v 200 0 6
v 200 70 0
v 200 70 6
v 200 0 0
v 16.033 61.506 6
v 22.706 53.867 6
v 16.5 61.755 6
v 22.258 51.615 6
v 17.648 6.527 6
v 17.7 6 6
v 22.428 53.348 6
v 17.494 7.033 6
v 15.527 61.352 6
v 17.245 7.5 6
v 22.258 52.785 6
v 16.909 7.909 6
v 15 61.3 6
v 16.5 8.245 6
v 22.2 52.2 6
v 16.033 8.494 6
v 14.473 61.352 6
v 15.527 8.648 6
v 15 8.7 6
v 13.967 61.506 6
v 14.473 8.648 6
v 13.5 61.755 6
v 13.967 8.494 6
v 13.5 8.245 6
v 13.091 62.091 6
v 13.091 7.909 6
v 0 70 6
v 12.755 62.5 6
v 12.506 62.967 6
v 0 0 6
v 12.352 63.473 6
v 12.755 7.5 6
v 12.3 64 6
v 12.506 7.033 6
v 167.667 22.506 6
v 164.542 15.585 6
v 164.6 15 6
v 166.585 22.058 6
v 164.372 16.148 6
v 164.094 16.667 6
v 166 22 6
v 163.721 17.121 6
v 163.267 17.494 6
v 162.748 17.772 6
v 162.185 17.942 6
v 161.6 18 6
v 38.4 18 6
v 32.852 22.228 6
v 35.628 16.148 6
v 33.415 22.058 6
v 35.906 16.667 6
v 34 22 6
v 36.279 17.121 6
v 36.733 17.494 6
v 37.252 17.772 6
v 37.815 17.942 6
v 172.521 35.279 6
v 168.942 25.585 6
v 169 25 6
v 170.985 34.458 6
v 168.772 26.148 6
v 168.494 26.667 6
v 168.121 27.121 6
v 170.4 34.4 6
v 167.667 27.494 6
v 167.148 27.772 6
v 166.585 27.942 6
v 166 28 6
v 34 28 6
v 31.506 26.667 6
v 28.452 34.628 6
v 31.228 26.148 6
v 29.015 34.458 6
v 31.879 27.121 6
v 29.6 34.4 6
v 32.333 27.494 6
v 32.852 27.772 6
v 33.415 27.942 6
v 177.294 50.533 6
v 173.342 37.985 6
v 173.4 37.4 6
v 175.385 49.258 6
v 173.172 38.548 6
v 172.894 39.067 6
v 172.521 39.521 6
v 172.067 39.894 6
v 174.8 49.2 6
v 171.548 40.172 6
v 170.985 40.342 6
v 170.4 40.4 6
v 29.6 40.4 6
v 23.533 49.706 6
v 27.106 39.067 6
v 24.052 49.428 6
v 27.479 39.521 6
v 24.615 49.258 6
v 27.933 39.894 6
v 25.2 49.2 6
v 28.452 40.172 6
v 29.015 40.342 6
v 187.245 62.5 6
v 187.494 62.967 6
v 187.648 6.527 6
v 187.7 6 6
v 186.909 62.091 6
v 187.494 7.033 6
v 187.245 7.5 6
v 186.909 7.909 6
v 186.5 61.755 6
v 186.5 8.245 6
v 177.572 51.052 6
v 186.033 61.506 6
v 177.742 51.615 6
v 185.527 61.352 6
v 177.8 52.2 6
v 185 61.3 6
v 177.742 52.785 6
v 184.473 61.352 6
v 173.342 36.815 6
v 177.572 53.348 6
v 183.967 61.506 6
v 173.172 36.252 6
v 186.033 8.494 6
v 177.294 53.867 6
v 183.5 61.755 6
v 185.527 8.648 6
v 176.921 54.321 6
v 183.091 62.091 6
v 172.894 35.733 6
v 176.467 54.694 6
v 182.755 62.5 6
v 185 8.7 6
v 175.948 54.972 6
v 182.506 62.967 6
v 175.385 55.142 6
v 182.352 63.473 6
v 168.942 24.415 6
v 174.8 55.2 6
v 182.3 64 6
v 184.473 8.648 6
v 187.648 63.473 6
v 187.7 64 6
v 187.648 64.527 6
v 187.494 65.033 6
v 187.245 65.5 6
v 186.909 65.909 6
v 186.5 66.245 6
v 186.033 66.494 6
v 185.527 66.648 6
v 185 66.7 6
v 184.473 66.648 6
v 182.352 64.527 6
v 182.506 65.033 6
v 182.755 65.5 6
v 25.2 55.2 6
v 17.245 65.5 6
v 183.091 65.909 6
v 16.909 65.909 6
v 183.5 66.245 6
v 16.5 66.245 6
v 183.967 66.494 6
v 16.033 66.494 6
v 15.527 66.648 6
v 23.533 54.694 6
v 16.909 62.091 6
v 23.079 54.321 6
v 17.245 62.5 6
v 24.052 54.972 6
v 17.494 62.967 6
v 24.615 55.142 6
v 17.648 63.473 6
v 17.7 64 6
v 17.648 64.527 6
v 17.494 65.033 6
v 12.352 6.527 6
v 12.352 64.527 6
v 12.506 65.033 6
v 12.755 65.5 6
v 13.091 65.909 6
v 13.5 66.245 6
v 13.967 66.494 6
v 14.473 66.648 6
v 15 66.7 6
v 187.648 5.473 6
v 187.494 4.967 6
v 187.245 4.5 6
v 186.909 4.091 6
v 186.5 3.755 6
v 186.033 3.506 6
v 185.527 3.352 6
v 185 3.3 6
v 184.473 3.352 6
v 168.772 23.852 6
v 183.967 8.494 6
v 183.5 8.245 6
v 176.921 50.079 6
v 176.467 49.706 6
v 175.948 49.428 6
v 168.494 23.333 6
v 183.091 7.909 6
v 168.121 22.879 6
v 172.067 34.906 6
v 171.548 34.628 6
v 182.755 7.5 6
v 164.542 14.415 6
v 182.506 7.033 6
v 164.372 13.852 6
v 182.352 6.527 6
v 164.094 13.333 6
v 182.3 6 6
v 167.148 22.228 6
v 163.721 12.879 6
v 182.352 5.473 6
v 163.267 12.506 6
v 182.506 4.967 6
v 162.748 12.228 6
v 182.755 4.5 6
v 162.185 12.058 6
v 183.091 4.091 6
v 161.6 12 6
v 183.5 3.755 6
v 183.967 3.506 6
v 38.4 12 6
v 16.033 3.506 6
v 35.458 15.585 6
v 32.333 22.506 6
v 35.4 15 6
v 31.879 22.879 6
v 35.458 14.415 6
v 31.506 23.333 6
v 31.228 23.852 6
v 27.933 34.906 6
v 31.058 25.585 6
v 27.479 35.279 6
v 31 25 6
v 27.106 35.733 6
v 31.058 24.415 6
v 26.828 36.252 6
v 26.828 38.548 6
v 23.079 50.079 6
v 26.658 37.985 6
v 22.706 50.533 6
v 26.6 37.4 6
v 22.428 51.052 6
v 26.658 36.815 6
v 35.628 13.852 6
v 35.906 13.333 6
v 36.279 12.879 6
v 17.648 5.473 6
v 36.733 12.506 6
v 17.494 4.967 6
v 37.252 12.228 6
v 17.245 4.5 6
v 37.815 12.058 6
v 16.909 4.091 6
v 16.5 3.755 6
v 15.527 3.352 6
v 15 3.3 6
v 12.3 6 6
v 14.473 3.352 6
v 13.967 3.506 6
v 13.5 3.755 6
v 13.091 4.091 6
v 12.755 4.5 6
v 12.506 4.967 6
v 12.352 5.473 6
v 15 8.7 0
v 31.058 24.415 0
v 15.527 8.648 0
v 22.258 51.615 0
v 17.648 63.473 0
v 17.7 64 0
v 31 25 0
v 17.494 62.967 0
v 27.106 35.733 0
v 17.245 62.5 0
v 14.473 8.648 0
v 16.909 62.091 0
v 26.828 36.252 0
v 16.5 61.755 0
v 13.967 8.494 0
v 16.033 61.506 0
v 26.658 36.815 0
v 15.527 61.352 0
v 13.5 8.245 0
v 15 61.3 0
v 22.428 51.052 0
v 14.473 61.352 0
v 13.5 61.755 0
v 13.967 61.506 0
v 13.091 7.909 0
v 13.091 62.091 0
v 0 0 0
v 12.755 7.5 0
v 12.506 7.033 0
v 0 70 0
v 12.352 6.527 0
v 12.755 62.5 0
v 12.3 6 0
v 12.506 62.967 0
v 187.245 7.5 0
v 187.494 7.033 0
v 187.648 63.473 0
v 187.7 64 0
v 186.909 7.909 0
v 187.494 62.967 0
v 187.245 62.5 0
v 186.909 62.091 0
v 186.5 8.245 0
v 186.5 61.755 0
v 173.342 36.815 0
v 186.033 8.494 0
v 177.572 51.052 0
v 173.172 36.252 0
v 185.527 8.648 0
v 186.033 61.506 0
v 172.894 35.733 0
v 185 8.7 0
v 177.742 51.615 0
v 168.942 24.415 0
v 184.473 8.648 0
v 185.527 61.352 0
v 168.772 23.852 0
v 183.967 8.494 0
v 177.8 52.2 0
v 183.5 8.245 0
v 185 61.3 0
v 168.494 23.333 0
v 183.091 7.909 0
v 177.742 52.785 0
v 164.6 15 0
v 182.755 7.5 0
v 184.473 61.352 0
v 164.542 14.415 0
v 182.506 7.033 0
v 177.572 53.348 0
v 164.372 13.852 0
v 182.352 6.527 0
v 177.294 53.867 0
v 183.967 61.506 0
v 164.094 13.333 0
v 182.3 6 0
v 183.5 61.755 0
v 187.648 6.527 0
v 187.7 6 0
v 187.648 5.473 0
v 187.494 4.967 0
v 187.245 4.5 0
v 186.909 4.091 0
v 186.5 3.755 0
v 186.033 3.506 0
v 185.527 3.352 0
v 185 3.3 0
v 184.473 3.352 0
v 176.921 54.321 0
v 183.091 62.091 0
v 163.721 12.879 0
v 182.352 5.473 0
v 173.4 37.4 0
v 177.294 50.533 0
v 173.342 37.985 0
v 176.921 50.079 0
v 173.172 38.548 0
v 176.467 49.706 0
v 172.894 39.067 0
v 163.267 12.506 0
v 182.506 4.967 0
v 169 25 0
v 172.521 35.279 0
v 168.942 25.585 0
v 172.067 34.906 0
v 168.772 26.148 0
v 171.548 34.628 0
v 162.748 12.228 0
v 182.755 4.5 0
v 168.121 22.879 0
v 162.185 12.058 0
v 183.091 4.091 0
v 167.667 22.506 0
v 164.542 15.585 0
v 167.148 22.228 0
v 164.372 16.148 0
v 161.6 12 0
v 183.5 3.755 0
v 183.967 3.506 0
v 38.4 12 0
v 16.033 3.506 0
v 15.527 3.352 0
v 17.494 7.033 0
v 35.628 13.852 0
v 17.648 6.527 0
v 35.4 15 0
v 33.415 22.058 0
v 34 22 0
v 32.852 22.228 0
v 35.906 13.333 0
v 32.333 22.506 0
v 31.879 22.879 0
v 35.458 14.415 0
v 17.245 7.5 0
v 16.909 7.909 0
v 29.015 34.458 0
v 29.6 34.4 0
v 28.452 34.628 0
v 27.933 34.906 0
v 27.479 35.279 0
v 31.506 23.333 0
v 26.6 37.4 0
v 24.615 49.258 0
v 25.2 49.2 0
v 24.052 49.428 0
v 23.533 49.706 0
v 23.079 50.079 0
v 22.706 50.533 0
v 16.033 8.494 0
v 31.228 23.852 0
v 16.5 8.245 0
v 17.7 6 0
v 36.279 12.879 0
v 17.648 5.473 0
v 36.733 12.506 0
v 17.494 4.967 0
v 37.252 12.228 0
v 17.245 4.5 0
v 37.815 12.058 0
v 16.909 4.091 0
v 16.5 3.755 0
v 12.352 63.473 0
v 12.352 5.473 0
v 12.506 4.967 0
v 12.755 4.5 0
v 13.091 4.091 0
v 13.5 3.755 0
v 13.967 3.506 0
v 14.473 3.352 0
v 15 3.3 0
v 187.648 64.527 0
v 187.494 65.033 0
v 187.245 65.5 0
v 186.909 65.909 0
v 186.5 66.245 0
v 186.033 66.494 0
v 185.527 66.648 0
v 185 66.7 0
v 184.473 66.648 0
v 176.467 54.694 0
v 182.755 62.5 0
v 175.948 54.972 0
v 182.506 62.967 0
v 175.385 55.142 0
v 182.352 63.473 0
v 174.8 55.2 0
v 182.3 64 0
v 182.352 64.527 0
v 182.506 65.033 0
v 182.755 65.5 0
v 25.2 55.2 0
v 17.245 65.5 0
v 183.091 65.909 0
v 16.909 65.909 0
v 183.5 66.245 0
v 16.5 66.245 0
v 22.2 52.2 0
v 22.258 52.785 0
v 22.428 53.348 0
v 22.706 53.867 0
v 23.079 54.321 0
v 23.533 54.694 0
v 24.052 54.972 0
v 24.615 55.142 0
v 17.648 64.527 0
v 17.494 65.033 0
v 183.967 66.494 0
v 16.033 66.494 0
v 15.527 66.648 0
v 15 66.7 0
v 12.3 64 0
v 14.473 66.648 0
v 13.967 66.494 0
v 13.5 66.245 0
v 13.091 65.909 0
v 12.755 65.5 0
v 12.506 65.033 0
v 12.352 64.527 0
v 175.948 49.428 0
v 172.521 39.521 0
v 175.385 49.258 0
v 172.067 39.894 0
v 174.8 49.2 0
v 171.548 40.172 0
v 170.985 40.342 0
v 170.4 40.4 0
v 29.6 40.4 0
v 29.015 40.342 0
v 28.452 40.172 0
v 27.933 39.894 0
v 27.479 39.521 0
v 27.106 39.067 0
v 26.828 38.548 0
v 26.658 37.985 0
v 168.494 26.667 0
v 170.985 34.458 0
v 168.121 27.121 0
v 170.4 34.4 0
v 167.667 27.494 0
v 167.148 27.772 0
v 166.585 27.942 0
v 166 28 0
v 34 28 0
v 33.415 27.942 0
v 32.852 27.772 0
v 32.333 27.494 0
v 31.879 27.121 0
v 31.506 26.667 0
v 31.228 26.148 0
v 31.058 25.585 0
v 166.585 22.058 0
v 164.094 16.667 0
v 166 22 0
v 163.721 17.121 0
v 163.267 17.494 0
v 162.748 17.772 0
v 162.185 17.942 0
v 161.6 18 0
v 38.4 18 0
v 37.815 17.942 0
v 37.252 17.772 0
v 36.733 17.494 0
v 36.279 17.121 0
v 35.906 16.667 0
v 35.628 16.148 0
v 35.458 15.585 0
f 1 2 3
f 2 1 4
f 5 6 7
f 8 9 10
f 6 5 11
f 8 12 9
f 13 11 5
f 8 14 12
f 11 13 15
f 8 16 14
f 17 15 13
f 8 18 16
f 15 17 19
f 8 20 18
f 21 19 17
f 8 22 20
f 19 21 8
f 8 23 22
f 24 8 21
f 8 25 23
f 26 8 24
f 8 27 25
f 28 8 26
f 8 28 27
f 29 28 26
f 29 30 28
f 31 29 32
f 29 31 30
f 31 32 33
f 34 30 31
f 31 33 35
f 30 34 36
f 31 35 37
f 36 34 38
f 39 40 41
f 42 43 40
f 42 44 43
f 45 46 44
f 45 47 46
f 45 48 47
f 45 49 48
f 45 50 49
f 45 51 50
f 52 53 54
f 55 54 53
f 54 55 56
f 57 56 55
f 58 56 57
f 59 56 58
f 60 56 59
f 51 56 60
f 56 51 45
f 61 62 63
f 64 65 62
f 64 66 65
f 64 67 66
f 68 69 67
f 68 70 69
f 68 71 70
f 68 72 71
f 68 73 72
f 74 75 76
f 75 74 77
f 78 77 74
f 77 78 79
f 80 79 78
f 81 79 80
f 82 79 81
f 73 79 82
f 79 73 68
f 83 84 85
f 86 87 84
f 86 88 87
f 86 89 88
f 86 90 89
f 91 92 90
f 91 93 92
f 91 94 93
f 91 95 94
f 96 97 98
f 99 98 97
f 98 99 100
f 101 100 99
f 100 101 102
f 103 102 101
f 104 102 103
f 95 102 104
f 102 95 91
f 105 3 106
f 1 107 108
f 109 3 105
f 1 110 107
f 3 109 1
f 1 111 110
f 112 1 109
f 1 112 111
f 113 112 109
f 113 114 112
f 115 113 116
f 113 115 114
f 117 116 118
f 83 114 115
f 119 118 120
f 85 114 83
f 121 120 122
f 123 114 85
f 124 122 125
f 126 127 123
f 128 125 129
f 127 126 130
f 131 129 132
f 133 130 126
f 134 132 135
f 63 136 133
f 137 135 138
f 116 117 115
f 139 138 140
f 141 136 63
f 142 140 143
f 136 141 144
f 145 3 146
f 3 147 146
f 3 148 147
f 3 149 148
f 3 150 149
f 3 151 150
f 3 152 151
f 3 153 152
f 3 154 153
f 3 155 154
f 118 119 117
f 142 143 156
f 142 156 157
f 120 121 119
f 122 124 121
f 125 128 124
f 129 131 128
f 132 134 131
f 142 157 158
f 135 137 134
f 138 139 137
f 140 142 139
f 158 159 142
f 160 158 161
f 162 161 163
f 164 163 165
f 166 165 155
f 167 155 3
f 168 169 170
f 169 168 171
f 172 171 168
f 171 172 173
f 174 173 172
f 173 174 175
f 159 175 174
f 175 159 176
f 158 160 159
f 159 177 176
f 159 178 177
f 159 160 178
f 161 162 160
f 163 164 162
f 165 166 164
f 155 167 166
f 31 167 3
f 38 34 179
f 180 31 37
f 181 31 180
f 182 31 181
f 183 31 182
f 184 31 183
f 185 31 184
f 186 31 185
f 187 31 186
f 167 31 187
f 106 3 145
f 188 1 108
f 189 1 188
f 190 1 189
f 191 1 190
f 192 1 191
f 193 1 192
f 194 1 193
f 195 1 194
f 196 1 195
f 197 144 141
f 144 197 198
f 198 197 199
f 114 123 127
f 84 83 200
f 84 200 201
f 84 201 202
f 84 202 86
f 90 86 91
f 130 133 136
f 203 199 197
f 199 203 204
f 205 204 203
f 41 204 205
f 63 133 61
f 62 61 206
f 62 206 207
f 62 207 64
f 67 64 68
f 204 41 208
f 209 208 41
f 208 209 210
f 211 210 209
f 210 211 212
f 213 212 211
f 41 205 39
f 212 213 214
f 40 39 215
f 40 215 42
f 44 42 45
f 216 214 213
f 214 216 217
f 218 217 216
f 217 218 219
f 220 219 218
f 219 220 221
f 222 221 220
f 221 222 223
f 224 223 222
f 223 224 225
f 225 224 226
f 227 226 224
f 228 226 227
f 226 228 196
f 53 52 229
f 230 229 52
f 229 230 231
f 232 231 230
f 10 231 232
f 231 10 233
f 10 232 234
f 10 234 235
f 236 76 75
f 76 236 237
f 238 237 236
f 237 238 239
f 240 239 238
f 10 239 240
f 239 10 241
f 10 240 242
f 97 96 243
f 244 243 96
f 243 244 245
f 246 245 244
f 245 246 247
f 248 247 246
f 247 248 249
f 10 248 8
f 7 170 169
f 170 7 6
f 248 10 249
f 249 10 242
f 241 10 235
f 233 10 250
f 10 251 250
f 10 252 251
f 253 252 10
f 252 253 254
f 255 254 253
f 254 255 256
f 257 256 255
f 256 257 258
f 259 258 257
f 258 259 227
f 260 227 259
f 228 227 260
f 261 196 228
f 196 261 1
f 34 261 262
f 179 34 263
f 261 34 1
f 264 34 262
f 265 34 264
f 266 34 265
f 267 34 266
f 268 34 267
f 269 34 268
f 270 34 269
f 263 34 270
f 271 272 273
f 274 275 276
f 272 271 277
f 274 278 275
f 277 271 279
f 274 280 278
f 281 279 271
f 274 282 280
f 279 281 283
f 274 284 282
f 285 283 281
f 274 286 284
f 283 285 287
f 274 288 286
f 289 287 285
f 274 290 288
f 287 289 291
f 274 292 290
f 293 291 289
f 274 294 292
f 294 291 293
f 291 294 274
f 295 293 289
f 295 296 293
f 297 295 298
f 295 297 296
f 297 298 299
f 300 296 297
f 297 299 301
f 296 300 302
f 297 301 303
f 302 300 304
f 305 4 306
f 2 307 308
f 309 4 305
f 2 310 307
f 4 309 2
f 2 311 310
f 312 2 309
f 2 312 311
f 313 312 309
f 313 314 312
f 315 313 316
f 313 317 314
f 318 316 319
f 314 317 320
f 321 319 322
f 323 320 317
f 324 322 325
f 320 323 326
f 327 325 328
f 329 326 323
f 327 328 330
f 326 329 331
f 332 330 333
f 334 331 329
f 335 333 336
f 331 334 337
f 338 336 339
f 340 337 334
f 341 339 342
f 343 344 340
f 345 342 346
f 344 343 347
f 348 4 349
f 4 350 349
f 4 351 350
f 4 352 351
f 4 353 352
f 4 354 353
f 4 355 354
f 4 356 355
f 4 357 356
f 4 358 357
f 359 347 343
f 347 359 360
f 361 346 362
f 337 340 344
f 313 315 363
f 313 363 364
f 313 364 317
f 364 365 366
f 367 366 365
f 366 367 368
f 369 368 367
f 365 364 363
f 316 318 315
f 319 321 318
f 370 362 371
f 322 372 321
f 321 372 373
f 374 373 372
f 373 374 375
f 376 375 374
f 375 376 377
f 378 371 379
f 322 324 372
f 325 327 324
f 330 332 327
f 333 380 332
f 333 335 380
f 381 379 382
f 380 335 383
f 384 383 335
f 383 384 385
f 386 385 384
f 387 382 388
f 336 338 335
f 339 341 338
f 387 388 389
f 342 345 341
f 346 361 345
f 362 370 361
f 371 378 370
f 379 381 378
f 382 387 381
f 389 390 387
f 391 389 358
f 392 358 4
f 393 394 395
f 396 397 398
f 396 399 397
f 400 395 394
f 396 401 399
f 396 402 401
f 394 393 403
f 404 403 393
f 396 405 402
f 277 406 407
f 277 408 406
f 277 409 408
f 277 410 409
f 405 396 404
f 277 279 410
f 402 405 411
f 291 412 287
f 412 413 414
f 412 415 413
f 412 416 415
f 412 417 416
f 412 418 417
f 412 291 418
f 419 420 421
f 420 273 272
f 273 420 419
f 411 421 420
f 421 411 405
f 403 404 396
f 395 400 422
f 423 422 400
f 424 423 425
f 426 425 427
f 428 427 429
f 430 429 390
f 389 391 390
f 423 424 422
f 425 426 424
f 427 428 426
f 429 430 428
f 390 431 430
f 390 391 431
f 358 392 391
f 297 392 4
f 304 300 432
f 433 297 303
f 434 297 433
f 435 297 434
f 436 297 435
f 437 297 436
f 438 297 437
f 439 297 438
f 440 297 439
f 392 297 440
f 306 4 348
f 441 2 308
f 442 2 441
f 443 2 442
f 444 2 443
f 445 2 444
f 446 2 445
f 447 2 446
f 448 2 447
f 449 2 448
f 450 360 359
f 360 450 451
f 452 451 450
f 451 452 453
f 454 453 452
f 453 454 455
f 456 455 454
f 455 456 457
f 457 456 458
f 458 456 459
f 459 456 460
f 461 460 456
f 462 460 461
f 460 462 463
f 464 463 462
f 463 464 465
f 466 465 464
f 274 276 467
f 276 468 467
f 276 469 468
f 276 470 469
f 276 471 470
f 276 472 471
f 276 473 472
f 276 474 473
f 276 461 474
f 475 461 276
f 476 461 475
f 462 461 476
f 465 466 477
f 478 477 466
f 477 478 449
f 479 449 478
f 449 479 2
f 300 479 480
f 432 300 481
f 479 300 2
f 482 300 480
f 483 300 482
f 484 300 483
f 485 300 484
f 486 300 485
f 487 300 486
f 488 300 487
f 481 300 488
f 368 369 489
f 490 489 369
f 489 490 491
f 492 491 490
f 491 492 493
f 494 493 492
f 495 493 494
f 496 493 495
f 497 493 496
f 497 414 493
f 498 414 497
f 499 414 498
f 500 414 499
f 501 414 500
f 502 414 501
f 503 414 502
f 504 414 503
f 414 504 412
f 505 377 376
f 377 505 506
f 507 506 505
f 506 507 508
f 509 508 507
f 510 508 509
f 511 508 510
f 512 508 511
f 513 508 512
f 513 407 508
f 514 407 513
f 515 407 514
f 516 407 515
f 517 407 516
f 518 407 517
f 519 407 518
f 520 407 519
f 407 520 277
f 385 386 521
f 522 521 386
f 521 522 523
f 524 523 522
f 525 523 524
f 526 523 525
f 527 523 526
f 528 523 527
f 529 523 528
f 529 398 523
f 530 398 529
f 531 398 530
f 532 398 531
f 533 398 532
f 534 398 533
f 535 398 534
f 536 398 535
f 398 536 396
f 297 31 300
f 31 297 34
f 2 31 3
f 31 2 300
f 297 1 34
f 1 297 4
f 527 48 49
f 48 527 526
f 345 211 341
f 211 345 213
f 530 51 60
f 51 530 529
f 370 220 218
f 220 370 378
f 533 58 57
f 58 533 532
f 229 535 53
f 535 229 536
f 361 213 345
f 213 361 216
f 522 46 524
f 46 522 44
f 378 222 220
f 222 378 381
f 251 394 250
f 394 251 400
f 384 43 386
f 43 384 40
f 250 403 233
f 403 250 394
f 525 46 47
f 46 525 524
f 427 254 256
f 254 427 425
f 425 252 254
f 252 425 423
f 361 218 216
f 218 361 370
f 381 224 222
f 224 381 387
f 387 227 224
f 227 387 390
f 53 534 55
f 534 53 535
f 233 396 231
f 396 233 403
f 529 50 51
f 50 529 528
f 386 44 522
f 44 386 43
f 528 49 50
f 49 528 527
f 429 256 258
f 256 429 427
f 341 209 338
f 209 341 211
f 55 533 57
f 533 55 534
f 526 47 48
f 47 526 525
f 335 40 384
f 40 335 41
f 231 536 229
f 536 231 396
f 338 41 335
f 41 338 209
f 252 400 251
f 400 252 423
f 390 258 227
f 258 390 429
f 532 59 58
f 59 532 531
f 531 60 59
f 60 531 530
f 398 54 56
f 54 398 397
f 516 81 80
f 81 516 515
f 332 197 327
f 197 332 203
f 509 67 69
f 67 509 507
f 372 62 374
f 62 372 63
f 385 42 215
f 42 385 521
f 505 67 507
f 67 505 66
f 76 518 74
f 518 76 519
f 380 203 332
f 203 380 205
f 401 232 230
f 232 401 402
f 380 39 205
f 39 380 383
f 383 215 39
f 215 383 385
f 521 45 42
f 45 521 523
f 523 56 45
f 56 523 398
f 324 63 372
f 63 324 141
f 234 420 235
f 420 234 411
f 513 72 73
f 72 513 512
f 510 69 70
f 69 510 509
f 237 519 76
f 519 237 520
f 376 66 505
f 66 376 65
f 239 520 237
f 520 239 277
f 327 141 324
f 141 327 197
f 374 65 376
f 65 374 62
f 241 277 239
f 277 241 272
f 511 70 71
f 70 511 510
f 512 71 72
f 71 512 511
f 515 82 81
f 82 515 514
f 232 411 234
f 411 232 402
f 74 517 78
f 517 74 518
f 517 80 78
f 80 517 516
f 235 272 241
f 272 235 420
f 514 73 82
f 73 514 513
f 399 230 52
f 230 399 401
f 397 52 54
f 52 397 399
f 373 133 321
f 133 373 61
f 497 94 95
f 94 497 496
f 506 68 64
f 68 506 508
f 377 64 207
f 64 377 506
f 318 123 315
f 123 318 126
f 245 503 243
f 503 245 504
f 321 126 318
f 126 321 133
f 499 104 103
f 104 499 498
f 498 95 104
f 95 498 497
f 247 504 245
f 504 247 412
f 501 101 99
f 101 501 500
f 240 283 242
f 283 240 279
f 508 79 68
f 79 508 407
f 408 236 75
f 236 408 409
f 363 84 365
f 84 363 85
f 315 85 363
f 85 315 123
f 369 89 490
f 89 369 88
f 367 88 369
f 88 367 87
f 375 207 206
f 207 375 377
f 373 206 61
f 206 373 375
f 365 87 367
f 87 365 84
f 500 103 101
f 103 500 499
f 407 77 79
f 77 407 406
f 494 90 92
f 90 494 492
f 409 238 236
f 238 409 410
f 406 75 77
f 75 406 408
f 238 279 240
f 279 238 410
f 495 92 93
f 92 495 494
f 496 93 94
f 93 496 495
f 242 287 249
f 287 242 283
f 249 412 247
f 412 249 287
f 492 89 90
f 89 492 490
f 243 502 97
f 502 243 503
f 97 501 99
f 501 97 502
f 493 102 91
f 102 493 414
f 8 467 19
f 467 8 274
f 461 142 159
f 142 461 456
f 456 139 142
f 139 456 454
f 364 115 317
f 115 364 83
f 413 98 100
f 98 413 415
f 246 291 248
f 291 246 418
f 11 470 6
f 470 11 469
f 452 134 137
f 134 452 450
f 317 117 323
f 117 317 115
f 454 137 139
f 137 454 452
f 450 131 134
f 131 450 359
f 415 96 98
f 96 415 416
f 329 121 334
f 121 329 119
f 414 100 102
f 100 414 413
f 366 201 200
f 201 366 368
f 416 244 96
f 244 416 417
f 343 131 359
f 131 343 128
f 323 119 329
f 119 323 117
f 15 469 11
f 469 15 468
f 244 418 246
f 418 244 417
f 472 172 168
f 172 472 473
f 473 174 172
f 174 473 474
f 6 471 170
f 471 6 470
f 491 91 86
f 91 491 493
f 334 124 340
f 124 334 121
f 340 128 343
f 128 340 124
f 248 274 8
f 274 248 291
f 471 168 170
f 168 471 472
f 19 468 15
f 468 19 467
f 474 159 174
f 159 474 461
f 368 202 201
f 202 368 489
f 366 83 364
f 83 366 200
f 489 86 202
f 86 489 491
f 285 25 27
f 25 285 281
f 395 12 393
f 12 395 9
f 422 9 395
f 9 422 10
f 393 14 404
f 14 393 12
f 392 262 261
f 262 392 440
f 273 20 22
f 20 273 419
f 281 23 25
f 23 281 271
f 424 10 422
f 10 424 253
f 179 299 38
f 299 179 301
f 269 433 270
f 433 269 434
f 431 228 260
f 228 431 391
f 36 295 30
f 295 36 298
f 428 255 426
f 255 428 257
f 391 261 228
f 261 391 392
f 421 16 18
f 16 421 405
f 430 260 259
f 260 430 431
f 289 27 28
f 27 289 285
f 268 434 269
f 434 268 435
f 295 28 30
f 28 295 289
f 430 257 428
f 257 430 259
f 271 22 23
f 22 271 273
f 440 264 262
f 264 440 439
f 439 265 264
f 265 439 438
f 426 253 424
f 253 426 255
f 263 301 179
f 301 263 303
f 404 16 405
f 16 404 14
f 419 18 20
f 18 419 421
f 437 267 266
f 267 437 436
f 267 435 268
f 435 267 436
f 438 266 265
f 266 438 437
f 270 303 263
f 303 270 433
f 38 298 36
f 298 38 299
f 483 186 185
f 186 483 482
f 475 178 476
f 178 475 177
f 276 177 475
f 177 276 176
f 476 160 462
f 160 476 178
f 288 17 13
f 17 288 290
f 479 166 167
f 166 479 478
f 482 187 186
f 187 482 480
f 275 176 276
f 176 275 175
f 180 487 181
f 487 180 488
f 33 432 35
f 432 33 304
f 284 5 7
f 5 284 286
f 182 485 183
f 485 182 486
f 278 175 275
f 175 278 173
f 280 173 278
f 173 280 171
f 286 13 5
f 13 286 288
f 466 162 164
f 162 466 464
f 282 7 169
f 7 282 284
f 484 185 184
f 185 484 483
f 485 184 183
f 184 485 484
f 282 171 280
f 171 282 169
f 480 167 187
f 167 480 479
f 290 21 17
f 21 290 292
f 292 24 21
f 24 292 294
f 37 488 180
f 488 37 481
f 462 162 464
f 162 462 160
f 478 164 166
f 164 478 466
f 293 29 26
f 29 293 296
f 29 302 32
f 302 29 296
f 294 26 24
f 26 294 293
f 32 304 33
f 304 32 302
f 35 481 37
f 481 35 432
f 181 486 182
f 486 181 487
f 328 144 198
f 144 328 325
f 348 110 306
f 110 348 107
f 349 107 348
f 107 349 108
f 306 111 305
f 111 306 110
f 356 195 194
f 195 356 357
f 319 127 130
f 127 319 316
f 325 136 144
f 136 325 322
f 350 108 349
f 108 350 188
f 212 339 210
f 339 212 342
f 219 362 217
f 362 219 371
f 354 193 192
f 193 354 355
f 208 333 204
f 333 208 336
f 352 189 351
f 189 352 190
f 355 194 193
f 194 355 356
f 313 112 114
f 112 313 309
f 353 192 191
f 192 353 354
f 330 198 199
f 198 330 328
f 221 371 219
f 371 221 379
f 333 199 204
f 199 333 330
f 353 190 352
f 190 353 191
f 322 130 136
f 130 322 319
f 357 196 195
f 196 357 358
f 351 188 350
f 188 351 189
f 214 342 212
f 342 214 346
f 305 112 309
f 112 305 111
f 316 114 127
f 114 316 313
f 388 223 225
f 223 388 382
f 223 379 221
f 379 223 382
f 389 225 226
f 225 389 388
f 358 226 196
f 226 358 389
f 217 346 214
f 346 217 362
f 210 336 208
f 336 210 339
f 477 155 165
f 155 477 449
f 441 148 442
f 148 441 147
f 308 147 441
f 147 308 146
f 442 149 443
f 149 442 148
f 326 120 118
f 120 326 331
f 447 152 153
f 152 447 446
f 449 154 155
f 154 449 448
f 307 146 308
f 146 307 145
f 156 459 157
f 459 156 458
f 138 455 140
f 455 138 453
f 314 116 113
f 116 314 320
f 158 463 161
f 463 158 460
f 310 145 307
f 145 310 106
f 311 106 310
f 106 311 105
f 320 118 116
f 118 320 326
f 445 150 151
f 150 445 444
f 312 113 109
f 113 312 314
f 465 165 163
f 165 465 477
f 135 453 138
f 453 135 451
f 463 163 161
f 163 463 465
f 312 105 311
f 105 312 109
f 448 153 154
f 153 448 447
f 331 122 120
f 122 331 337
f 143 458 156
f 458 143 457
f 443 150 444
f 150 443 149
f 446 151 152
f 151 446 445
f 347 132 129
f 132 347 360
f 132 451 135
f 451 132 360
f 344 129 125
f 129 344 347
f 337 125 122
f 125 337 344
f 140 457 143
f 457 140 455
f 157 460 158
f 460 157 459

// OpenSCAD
$fn = 32;

// ----------------------------------------------------------------------
// Slotted panel: 200 x 70 mm, 4 ряда of slots
// ----------------------------------------------------------------------

// --- parameters (mm) ---
panel_w = 200;            // panel width
panel_d = 70;             // panel depth
thick = 6;                // panel thickness
slot_w = 6;               // slot width
pitch0 = 10;              // first row pitch
pitch_step = 2.4;         // pitch increase per row
margin = 12;              // margin around the slot field
rows = 4;                 // number of slot rows
mount_d = 5.4;            // mounting holes
mount_x = 85;             // mounting hole offset

difference() {
  union() {
    cube([panel_w, panel_d, thick]);
  }
  /* slot rows: stadium shaped cutters, 2.5 mm clear of both faces */
  /* row 0: pitch 10, length 123.2 */
  hull() {
    translate([38.4, 15, -2.5]) cylinder(h = thick + 5, d = slot_w);
    translate([161.6, 15, -2.5]) cylinder(h = thick + 5, d = slot_w);
  }
  /* row 1: pitch 12.4, length 132 */
  hull() {
    translate([34, 25, -2.5]) cylinder(h = thick + 5, d = slot_w);
    translate([166, 25, -2.5]) cylinder(h = thick + 5, d = slot_w);
  }
  /* row 2: pitch 14.8, length 140.8 */
  hull() {
    translate([29.6, 37.4, -2.5]) cylinder(h = thick + 5, d = slot_w);
    translate([170.4, 37.4, -2.5]) cylinder(h = thick + 5, d = slot_w);
  }
  /* row 3: pitch 17.2, length 149.6 */
  hull() {
    translate([25.2, 52.2, -2.5]) cylinder(h = thick + 5, d = slot_w);
    translate([174.8, 52.2, -2.5]) cylinder(h = thick + 5, d = slot_w);
  }
  translate([15, 6, -2.5]) cylinder(h = 11, d = mount_d);
  translate([15, 64, -2.5]) cylinder(h = 11, d = mount_d);
  translate([185, 6, -2.5]) cylinder(h = 11, d = mount_d);
  translate([185, 64, -2.5]) cylinder(h = 11, d = mount_d);
}
